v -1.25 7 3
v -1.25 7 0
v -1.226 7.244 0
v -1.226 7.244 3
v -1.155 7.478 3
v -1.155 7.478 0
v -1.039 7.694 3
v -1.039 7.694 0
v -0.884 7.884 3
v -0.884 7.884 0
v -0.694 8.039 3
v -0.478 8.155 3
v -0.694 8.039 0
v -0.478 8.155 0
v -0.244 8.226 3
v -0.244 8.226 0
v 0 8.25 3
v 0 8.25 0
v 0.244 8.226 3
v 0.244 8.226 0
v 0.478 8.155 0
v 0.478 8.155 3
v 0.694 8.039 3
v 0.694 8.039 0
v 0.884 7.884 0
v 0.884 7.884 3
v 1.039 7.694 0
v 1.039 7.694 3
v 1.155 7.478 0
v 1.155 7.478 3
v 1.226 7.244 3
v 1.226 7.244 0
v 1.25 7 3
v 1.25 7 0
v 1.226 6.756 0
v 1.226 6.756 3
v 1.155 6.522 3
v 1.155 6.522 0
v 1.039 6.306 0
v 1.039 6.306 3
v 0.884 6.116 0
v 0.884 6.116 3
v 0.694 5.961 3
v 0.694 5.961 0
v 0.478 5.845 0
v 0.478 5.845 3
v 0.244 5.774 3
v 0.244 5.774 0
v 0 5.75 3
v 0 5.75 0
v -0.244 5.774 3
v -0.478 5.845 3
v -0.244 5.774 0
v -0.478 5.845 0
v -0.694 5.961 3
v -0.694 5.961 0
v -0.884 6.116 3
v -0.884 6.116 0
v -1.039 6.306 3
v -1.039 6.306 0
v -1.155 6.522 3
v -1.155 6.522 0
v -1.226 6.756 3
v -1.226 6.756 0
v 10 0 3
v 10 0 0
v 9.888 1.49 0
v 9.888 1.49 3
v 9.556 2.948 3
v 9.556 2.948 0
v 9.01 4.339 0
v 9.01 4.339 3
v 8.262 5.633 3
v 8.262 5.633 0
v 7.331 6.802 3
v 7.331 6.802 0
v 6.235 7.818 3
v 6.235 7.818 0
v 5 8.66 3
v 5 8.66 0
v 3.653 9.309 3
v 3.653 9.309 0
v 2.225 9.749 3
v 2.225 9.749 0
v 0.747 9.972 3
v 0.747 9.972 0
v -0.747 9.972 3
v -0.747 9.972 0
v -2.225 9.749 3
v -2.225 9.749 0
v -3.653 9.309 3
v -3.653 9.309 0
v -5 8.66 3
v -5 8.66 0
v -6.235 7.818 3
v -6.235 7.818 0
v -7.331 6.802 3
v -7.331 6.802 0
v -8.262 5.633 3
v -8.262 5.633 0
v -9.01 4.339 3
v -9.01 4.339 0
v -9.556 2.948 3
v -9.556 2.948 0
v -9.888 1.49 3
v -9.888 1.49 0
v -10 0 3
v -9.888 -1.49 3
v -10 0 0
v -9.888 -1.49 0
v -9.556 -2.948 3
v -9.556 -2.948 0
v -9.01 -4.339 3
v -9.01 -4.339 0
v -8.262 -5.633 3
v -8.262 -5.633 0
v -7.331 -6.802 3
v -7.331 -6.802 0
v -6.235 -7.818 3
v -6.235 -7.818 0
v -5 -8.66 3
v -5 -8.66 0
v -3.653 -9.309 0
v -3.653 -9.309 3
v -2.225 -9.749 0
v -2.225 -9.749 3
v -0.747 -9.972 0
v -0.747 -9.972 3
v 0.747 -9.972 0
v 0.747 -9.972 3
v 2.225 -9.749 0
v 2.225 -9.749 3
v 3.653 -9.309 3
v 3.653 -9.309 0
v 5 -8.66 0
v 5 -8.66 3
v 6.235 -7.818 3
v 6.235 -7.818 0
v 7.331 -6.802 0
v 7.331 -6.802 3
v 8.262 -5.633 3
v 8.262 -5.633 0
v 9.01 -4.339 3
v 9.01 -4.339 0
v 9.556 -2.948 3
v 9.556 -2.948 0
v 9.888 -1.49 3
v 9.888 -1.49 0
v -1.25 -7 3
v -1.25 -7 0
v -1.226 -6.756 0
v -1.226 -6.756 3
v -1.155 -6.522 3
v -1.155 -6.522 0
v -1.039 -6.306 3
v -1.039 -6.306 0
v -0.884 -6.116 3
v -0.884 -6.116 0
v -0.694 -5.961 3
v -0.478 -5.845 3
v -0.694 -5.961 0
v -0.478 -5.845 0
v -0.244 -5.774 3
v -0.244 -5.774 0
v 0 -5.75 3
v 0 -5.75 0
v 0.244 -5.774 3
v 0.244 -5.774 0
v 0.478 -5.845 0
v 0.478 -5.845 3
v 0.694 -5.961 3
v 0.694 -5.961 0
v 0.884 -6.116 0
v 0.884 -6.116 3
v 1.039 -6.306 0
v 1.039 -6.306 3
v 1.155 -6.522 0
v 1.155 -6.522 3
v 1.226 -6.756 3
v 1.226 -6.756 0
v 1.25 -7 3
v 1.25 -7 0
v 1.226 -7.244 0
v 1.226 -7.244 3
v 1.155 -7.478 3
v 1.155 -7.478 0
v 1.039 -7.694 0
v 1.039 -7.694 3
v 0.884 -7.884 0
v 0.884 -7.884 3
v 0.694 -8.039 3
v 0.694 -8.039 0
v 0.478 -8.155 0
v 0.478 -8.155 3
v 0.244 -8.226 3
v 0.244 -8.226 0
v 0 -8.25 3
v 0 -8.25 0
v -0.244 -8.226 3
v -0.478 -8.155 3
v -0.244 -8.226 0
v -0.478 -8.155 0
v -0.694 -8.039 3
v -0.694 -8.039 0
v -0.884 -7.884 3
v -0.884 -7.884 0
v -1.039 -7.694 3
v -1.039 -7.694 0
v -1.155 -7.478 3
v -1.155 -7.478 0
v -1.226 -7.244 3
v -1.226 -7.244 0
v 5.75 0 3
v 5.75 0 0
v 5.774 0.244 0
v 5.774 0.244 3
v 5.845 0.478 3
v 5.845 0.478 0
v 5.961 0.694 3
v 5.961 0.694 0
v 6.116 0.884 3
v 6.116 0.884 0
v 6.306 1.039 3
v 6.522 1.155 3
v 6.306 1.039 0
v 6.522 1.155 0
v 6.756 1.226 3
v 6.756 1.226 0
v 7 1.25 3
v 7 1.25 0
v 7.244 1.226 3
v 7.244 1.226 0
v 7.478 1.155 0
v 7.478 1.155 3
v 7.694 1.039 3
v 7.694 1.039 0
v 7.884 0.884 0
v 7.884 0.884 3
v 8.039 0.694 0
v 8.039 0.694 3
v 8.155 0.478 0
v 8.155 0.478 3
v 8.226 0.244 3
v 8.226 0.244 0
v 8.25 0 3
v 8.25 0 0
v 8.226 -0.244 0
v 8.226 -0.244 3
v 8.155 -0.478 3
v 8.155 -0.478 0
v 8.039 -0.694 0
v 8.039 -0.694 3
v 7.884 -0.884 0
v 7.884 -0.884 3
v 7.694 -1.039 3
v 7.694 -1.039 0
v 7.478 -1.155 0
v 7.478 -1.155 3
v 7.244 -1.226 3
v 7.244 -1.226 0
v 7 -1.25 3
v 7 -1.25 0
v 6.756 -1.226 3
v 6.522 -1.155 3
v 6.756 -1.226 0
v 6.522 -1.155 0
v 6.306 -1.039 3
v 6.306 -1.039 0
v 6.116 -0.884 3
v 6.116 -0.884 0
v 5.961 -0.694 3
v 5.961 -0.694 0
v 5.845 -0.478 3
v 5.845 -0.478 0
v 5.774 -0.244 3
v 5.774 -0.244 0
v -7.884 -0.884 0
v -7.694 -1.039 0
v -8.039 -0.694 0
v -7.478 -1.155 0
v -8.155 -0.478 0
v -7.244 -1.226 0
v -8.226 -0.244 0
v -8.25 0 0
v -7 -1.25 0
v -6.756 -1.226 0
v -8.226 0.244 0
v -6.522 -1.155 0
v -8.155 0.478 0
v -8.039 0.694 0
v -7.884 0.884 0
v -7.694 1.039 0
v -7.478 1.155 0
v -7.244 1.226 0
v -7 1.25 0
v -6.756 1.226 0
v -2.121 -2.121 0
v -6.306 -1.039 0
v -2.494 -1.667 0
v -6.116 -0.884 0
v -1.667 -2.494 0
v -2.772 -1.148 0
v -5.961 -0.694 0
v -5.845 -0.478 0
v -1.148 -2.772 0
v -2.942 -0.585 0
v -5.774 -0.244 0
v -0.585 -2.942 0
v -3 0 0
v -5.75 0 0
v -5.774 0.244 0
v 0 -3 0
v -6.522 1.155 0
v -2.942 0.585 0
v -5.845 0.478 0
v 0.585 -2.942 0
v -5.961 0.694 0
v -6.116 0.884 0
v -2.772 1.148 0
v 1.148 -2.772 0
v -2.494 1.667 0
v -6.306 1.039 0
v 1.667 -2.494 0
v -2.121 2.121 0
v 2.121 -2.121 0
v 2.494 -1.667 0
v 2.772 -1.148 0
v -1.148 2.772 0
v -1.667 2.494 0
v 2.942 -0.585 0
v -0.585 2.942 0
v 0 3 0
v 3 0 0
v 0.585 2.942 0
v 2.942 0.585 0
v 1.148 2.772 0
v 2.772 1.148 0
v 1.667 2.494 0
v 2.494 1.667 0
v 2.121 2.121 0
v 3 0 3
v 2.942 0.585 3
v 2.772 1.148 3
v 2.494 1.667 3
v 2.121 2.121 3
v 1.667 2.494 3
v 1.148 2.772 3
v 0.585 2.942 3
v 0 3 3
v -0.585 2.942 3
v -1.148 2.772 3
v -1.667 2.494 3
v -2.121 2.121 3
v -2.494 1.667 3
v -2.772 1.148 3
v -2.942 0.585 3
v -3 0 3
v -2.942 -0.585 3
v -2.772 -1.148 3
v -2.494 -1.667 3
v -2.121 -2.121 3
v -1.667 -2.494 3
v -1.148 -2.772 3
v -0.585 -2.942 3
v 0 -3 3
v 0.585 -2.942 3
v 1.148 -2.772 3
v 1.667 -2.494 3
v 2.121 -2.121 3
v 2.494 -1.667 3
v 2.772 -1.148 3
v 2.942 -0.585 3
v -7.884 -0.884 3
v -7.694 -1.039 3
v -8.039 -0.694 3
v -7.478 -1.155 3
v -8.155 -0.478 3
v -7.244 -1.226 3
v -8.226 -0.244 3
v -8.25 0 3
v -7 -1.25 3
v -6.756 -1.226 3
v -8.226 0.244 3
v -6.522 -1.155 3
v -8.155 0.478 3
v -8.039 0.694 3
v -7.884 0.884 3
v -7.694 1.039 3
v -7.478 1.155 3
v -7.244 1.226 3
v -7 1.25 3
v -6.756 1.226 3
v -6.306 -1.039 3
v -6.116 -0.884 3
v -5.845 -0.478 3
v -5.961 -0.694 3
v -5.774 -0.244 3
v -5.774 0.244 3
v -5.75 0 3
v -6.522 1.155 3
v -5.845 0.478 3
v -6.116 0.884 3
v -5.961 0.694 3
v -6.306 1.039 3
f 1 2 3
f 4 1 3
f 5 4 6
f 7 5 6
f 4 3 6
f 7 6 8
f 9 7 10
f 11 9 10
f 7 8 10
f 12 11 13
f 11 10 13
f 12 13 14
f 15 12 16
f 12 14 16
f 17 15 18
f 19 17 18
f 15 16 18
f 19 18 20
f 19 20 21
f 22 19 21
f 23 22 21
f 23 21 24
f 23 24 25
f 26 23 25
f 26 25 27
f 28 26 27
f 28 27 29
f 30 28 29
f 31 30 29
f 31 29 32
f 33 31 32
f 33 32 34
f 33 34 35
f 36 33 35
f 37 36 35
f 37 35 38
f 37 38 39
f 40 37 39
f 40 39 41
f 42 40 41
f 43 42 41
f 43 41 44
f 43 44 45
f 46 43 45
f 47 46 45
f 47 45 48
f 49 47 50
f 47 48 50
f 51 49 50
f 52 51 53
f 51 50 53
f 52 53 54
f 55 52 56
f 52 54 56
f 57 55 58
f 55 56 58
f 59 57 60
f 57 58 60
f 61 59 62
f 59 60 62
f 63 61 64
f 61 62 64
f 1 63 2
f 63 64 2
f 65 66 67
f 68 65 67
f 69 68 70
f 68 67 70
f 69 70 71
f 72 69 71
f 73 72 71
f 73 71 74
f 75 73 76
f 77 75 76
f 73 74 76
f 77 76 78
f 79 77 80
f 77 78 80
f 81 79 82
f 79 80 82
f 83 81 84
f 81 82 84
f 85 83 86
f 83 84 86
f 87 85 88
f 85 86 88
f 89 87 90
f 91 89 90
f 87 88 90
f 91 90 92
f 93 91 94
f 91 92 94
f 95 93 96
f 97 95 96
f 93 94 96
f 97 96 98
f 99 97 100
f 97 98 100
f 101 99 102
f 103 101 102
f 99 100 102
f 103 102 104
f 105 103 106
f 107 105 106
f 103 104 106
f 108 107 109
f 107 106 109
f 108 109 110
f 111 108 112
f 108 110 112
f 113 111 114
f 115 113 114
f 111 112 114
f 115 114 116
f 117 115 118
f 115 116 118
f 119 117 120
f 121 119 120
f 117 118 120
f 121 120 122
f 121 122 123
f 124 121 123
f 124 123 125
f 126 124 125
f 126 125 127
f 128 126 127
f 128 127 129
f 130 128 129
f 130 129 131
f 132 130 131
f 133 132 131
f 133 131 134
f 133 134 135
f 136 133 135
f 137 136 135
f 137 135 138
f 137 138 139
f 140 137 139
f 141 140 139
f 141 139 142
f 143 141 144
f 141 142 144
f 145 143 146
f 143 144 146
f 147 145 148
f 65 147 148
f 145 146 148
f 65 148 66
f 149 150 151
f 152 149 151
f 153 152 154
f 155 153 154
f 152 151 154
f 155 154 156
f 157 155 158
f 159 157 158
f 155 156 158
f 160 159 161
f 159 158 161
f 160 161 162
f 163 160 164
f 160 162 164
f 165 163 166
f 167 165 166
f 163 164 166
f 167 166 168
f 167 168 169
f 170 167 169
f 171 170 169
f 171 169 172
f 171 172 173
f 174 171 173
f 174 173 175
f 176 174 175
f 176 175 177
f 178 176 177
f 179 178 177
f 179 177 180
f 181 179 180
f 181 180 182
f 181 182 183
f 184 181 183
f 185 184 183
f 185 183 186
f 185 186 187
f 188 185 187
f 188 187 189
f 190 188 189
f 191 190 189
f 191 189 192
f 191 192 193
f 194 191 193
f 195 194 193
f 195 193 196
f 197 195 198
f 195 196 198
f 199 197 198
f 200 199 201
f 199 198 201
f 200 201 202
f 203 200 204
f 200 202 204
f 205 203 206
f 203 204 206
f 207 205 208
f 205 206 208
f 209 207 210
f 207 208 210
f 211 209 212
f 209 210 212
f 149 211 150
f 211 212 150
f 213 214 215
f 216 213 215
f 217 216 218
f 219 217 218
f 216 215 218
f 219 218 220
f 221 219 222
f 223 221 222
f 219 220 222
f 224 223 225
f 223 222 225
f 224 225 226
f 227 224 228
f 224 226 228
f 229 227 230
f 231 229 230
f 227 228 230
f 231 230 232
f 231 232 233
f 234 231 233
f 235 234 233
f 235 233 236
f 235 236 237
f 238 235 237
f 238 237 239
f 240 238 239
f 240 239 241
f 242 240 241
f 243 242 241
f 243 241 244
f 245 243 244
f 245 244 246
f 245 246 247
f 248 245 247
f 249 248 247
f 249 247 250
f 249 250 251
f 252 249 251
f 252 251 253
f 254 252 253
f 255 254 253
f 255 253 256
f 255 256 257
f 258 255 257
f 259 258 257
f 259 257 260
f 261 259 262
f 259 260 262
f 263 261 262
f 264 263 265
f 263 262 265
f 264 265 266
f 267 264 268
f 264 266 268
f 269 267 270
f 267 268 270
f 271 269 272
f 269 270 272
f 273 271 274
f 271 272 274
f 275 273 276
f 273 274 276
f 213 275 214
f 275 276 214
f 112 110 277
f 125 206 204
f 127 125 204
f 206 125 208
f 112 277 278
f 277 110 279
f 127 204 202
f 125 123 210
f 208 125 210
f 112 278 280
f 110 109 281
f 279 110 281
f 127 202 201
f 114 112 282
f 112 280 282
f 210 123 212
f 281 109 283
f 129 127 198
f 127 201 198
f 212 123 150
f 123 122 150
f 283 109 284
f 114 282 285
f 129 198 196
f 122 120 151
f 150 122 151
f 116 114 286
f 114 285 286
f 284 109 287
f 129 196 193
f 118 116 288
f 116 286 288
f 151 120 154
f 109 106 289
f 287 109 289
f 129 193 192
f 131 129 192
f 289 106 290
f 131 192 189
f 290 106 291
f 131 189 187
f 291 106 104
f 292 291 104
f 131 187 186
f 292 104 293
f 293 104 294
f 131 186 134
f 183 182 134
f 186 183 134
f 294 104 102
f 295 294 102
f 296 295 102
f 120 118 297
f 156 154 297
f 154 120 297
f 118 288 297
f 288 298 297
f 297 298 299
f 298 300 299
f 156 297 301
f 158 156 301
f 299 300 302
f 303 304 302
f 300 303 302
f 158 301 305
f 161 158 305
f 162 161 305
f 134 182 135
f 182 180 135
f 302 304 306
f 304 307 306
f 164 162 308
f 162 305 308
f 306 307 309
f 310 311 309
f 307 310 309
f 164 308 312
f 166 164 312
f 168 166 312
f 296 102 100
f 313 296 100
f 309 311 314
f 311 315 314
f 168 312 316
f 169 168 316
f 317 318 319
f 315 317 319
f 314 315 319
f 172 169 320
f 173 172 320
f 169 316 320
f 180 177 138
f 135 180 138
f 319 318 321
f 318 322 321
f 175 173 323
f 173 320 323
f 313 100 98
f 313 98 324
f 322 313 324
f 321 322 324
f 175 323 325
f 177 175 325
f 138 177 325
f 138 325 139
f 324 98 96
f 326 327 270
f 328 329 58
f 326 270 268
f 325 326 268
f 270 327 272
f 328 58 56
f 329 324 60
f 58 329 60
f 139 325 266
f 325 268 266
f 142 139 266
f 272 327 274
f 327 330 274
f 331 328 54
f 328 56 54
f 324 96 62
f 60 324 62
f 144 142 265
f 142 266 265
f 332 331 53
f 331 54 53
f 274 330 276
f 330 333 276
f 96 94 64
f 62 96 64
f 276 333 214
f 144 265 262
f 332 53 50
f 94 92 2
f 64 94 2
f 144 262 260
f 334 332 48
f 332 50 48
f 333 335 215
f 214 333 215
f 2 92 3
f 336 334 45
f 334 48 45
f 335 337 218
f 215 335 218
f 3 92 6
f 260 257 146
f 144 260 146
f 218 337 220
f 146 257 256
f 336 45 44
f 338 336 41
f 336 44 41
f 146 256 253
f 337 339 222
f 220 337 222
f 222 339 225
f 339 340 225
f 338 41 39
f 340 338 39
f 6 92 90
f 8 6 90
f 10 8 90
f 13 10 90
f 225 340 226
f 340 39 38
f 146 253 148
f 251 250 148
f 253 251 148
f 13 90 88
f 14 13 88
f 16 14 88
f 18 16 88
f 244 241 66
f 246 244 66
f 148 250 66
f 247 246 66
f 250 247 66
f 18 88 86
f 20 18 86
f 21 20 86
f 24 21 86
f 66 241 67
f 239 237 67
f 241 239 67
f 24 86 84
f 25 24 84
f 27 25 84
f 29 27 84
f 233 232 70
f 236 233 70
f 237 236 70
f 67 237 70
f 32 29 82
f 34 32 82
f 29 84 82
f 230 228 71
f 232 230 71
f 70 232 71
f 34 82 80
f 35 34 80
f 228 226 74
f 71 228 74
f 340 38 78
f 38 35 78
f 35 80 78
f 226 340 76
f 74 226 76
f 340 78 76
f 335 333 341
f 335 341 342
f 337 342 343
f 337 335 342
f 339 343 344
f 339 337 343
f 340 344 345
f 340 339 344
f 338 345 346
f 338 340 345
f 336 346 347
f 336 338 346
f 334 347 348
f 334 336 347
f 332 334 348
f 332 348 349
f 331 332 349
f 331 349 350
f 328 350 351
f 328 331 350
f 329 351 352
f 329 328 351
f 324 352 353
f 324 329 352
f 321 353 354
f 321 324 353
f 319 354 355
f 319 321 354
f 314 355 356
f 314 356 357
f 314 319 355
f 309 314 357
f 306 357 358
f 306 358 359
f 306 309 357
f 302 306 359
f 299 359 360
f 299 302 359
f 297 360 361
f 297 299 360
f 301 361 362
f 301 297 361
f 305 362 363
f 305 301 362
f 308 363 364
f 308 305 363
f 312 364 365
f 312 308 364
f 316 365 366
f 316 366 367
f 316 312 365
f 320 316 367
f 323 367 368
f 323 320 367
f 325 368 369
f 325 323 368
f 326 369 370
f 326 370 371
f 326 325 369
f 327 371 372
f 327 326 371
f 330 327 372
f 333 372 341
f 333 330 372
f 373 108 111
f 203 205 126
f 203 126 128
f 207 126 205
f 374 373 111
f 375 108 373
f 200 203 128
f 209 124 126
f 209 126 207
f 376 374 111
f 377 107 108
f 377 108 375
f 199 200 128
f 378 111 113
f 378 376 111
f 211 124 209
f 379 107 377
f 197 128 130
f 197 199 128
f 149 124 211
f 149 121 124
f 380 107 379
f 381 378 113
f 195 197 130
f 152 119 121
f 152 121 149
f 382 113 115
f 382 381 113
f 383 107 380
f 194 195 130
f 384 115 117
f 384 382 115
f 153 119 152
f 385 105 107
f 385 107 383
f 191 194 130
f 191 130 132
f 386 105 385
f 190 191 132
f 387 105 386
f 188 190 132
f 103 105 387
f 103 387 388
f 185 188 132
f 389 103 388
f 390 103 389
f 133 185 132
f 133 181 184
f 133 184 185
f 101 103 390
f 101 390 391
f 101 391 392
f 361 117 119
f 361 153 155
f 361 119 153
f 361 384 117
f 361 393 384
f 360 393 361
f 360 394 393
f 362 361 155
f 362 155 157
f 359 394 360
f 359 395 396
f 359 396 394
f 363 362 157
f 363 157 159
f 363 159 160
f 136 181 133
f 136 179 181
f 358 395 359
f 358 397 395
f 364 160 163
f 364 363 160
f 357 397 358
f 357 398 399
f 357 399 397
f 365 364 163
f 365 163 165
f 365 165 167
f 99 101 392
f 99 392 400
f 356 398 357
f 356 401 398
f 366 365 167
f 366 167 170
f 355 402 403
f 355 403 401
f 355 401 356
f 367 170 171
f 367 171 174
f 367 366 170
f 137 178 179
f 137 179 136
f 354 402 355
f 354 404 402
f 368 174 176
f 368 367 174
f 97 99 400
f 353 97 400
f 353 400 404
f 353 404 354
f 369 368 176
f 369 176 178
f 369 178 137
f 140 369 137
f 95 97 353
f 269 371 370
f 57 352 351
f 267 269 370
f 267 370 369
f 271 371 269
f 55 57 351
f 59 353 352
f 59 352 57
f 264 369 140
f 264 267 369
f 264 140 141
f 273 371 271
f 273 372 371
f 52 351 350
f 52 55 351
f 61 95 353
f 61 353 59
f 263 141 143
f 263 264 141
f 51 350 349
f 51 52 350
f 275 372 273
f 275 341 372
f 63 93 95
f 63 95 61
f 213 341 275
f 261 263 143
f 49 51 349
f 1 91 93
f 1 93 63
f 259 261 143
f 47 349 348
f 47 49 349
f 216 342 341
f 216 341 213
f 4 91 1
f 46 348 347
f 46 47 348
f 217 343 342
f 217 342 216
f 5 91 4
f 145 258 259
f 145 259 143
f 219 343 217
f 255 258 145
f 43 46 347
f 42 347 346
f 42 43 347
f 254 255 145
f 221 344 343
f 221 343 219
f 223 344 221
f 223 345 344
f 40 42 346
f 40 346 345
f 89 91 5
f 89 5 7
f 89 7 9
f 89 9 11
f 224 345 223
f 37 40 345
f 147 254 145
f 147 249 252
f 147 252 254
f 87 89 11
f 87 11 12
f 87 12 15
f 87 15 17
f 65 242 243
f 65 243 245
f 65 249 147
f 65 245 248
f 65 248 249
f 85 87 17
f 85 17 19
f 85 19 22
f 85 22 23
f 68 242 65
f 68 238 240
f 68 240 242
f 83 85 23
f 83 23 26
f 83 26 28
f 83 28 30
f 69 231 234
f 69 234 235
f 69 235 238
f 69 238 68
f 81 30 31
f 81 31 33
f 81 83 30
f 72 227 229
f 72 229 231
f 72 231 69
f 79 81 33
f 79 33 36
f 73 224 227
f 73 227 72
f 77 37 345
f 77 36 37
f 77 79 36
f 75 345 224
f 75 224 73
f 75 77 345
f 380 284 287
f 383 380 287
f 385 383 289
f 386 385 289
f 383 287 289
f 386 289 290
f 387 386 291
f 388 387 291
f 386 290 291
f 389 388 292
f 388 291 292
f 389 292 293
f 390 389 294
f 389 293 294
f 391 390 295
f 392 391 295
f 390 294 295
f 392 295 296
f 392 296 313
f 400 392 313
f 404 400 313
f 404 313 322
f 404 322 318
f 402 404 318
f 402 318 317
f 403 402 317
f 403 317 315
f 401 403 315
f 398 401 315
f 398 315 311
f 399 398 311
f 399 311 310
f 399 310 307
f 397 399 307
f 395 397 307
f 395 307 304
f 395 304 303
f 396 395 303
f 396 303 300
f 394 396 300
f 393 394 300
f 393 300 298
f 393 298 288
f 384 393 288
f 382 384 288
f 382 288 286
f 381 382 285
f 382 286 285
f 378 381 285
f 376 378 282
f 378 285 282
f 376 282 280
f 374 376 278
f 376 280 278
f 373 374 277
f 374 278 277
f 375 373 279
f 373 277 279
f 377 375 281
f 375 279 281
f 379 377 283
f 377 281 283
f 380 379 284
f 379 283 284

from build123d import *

# Parameters (mm, degrees)
SKETCH_1_R         = 10
SKETCH_1_R_2       = 3
EXTRUDE_1_DEPTH    = 3
HOLE_WIZARD_M3_1_D = 2.5


with BuildPart() as part:
    # 草图1 → 凸台-拉伸1 (new body)
    with BuildSketch(Plane.XY):
        Circle(SKETCH_1_R)
        Circle(SKETCH_1_R_2, mode=Mode.SUBTRACT)
    extrude(amount=EXTRUDE_1_DEPTH)

    # M3 螺纹孔1 (through all)
    with Locations(Plane(origin=(0, 7, 3), x_dir=(1, 0, 0), z_dir=(0, 0, 1))):
        with Locations((0, 0), (-7, -7), (0, -14), (7, -7)):
            Hole(HOLE_WIZARD_M3_1_D / 2)


solid = part.part
